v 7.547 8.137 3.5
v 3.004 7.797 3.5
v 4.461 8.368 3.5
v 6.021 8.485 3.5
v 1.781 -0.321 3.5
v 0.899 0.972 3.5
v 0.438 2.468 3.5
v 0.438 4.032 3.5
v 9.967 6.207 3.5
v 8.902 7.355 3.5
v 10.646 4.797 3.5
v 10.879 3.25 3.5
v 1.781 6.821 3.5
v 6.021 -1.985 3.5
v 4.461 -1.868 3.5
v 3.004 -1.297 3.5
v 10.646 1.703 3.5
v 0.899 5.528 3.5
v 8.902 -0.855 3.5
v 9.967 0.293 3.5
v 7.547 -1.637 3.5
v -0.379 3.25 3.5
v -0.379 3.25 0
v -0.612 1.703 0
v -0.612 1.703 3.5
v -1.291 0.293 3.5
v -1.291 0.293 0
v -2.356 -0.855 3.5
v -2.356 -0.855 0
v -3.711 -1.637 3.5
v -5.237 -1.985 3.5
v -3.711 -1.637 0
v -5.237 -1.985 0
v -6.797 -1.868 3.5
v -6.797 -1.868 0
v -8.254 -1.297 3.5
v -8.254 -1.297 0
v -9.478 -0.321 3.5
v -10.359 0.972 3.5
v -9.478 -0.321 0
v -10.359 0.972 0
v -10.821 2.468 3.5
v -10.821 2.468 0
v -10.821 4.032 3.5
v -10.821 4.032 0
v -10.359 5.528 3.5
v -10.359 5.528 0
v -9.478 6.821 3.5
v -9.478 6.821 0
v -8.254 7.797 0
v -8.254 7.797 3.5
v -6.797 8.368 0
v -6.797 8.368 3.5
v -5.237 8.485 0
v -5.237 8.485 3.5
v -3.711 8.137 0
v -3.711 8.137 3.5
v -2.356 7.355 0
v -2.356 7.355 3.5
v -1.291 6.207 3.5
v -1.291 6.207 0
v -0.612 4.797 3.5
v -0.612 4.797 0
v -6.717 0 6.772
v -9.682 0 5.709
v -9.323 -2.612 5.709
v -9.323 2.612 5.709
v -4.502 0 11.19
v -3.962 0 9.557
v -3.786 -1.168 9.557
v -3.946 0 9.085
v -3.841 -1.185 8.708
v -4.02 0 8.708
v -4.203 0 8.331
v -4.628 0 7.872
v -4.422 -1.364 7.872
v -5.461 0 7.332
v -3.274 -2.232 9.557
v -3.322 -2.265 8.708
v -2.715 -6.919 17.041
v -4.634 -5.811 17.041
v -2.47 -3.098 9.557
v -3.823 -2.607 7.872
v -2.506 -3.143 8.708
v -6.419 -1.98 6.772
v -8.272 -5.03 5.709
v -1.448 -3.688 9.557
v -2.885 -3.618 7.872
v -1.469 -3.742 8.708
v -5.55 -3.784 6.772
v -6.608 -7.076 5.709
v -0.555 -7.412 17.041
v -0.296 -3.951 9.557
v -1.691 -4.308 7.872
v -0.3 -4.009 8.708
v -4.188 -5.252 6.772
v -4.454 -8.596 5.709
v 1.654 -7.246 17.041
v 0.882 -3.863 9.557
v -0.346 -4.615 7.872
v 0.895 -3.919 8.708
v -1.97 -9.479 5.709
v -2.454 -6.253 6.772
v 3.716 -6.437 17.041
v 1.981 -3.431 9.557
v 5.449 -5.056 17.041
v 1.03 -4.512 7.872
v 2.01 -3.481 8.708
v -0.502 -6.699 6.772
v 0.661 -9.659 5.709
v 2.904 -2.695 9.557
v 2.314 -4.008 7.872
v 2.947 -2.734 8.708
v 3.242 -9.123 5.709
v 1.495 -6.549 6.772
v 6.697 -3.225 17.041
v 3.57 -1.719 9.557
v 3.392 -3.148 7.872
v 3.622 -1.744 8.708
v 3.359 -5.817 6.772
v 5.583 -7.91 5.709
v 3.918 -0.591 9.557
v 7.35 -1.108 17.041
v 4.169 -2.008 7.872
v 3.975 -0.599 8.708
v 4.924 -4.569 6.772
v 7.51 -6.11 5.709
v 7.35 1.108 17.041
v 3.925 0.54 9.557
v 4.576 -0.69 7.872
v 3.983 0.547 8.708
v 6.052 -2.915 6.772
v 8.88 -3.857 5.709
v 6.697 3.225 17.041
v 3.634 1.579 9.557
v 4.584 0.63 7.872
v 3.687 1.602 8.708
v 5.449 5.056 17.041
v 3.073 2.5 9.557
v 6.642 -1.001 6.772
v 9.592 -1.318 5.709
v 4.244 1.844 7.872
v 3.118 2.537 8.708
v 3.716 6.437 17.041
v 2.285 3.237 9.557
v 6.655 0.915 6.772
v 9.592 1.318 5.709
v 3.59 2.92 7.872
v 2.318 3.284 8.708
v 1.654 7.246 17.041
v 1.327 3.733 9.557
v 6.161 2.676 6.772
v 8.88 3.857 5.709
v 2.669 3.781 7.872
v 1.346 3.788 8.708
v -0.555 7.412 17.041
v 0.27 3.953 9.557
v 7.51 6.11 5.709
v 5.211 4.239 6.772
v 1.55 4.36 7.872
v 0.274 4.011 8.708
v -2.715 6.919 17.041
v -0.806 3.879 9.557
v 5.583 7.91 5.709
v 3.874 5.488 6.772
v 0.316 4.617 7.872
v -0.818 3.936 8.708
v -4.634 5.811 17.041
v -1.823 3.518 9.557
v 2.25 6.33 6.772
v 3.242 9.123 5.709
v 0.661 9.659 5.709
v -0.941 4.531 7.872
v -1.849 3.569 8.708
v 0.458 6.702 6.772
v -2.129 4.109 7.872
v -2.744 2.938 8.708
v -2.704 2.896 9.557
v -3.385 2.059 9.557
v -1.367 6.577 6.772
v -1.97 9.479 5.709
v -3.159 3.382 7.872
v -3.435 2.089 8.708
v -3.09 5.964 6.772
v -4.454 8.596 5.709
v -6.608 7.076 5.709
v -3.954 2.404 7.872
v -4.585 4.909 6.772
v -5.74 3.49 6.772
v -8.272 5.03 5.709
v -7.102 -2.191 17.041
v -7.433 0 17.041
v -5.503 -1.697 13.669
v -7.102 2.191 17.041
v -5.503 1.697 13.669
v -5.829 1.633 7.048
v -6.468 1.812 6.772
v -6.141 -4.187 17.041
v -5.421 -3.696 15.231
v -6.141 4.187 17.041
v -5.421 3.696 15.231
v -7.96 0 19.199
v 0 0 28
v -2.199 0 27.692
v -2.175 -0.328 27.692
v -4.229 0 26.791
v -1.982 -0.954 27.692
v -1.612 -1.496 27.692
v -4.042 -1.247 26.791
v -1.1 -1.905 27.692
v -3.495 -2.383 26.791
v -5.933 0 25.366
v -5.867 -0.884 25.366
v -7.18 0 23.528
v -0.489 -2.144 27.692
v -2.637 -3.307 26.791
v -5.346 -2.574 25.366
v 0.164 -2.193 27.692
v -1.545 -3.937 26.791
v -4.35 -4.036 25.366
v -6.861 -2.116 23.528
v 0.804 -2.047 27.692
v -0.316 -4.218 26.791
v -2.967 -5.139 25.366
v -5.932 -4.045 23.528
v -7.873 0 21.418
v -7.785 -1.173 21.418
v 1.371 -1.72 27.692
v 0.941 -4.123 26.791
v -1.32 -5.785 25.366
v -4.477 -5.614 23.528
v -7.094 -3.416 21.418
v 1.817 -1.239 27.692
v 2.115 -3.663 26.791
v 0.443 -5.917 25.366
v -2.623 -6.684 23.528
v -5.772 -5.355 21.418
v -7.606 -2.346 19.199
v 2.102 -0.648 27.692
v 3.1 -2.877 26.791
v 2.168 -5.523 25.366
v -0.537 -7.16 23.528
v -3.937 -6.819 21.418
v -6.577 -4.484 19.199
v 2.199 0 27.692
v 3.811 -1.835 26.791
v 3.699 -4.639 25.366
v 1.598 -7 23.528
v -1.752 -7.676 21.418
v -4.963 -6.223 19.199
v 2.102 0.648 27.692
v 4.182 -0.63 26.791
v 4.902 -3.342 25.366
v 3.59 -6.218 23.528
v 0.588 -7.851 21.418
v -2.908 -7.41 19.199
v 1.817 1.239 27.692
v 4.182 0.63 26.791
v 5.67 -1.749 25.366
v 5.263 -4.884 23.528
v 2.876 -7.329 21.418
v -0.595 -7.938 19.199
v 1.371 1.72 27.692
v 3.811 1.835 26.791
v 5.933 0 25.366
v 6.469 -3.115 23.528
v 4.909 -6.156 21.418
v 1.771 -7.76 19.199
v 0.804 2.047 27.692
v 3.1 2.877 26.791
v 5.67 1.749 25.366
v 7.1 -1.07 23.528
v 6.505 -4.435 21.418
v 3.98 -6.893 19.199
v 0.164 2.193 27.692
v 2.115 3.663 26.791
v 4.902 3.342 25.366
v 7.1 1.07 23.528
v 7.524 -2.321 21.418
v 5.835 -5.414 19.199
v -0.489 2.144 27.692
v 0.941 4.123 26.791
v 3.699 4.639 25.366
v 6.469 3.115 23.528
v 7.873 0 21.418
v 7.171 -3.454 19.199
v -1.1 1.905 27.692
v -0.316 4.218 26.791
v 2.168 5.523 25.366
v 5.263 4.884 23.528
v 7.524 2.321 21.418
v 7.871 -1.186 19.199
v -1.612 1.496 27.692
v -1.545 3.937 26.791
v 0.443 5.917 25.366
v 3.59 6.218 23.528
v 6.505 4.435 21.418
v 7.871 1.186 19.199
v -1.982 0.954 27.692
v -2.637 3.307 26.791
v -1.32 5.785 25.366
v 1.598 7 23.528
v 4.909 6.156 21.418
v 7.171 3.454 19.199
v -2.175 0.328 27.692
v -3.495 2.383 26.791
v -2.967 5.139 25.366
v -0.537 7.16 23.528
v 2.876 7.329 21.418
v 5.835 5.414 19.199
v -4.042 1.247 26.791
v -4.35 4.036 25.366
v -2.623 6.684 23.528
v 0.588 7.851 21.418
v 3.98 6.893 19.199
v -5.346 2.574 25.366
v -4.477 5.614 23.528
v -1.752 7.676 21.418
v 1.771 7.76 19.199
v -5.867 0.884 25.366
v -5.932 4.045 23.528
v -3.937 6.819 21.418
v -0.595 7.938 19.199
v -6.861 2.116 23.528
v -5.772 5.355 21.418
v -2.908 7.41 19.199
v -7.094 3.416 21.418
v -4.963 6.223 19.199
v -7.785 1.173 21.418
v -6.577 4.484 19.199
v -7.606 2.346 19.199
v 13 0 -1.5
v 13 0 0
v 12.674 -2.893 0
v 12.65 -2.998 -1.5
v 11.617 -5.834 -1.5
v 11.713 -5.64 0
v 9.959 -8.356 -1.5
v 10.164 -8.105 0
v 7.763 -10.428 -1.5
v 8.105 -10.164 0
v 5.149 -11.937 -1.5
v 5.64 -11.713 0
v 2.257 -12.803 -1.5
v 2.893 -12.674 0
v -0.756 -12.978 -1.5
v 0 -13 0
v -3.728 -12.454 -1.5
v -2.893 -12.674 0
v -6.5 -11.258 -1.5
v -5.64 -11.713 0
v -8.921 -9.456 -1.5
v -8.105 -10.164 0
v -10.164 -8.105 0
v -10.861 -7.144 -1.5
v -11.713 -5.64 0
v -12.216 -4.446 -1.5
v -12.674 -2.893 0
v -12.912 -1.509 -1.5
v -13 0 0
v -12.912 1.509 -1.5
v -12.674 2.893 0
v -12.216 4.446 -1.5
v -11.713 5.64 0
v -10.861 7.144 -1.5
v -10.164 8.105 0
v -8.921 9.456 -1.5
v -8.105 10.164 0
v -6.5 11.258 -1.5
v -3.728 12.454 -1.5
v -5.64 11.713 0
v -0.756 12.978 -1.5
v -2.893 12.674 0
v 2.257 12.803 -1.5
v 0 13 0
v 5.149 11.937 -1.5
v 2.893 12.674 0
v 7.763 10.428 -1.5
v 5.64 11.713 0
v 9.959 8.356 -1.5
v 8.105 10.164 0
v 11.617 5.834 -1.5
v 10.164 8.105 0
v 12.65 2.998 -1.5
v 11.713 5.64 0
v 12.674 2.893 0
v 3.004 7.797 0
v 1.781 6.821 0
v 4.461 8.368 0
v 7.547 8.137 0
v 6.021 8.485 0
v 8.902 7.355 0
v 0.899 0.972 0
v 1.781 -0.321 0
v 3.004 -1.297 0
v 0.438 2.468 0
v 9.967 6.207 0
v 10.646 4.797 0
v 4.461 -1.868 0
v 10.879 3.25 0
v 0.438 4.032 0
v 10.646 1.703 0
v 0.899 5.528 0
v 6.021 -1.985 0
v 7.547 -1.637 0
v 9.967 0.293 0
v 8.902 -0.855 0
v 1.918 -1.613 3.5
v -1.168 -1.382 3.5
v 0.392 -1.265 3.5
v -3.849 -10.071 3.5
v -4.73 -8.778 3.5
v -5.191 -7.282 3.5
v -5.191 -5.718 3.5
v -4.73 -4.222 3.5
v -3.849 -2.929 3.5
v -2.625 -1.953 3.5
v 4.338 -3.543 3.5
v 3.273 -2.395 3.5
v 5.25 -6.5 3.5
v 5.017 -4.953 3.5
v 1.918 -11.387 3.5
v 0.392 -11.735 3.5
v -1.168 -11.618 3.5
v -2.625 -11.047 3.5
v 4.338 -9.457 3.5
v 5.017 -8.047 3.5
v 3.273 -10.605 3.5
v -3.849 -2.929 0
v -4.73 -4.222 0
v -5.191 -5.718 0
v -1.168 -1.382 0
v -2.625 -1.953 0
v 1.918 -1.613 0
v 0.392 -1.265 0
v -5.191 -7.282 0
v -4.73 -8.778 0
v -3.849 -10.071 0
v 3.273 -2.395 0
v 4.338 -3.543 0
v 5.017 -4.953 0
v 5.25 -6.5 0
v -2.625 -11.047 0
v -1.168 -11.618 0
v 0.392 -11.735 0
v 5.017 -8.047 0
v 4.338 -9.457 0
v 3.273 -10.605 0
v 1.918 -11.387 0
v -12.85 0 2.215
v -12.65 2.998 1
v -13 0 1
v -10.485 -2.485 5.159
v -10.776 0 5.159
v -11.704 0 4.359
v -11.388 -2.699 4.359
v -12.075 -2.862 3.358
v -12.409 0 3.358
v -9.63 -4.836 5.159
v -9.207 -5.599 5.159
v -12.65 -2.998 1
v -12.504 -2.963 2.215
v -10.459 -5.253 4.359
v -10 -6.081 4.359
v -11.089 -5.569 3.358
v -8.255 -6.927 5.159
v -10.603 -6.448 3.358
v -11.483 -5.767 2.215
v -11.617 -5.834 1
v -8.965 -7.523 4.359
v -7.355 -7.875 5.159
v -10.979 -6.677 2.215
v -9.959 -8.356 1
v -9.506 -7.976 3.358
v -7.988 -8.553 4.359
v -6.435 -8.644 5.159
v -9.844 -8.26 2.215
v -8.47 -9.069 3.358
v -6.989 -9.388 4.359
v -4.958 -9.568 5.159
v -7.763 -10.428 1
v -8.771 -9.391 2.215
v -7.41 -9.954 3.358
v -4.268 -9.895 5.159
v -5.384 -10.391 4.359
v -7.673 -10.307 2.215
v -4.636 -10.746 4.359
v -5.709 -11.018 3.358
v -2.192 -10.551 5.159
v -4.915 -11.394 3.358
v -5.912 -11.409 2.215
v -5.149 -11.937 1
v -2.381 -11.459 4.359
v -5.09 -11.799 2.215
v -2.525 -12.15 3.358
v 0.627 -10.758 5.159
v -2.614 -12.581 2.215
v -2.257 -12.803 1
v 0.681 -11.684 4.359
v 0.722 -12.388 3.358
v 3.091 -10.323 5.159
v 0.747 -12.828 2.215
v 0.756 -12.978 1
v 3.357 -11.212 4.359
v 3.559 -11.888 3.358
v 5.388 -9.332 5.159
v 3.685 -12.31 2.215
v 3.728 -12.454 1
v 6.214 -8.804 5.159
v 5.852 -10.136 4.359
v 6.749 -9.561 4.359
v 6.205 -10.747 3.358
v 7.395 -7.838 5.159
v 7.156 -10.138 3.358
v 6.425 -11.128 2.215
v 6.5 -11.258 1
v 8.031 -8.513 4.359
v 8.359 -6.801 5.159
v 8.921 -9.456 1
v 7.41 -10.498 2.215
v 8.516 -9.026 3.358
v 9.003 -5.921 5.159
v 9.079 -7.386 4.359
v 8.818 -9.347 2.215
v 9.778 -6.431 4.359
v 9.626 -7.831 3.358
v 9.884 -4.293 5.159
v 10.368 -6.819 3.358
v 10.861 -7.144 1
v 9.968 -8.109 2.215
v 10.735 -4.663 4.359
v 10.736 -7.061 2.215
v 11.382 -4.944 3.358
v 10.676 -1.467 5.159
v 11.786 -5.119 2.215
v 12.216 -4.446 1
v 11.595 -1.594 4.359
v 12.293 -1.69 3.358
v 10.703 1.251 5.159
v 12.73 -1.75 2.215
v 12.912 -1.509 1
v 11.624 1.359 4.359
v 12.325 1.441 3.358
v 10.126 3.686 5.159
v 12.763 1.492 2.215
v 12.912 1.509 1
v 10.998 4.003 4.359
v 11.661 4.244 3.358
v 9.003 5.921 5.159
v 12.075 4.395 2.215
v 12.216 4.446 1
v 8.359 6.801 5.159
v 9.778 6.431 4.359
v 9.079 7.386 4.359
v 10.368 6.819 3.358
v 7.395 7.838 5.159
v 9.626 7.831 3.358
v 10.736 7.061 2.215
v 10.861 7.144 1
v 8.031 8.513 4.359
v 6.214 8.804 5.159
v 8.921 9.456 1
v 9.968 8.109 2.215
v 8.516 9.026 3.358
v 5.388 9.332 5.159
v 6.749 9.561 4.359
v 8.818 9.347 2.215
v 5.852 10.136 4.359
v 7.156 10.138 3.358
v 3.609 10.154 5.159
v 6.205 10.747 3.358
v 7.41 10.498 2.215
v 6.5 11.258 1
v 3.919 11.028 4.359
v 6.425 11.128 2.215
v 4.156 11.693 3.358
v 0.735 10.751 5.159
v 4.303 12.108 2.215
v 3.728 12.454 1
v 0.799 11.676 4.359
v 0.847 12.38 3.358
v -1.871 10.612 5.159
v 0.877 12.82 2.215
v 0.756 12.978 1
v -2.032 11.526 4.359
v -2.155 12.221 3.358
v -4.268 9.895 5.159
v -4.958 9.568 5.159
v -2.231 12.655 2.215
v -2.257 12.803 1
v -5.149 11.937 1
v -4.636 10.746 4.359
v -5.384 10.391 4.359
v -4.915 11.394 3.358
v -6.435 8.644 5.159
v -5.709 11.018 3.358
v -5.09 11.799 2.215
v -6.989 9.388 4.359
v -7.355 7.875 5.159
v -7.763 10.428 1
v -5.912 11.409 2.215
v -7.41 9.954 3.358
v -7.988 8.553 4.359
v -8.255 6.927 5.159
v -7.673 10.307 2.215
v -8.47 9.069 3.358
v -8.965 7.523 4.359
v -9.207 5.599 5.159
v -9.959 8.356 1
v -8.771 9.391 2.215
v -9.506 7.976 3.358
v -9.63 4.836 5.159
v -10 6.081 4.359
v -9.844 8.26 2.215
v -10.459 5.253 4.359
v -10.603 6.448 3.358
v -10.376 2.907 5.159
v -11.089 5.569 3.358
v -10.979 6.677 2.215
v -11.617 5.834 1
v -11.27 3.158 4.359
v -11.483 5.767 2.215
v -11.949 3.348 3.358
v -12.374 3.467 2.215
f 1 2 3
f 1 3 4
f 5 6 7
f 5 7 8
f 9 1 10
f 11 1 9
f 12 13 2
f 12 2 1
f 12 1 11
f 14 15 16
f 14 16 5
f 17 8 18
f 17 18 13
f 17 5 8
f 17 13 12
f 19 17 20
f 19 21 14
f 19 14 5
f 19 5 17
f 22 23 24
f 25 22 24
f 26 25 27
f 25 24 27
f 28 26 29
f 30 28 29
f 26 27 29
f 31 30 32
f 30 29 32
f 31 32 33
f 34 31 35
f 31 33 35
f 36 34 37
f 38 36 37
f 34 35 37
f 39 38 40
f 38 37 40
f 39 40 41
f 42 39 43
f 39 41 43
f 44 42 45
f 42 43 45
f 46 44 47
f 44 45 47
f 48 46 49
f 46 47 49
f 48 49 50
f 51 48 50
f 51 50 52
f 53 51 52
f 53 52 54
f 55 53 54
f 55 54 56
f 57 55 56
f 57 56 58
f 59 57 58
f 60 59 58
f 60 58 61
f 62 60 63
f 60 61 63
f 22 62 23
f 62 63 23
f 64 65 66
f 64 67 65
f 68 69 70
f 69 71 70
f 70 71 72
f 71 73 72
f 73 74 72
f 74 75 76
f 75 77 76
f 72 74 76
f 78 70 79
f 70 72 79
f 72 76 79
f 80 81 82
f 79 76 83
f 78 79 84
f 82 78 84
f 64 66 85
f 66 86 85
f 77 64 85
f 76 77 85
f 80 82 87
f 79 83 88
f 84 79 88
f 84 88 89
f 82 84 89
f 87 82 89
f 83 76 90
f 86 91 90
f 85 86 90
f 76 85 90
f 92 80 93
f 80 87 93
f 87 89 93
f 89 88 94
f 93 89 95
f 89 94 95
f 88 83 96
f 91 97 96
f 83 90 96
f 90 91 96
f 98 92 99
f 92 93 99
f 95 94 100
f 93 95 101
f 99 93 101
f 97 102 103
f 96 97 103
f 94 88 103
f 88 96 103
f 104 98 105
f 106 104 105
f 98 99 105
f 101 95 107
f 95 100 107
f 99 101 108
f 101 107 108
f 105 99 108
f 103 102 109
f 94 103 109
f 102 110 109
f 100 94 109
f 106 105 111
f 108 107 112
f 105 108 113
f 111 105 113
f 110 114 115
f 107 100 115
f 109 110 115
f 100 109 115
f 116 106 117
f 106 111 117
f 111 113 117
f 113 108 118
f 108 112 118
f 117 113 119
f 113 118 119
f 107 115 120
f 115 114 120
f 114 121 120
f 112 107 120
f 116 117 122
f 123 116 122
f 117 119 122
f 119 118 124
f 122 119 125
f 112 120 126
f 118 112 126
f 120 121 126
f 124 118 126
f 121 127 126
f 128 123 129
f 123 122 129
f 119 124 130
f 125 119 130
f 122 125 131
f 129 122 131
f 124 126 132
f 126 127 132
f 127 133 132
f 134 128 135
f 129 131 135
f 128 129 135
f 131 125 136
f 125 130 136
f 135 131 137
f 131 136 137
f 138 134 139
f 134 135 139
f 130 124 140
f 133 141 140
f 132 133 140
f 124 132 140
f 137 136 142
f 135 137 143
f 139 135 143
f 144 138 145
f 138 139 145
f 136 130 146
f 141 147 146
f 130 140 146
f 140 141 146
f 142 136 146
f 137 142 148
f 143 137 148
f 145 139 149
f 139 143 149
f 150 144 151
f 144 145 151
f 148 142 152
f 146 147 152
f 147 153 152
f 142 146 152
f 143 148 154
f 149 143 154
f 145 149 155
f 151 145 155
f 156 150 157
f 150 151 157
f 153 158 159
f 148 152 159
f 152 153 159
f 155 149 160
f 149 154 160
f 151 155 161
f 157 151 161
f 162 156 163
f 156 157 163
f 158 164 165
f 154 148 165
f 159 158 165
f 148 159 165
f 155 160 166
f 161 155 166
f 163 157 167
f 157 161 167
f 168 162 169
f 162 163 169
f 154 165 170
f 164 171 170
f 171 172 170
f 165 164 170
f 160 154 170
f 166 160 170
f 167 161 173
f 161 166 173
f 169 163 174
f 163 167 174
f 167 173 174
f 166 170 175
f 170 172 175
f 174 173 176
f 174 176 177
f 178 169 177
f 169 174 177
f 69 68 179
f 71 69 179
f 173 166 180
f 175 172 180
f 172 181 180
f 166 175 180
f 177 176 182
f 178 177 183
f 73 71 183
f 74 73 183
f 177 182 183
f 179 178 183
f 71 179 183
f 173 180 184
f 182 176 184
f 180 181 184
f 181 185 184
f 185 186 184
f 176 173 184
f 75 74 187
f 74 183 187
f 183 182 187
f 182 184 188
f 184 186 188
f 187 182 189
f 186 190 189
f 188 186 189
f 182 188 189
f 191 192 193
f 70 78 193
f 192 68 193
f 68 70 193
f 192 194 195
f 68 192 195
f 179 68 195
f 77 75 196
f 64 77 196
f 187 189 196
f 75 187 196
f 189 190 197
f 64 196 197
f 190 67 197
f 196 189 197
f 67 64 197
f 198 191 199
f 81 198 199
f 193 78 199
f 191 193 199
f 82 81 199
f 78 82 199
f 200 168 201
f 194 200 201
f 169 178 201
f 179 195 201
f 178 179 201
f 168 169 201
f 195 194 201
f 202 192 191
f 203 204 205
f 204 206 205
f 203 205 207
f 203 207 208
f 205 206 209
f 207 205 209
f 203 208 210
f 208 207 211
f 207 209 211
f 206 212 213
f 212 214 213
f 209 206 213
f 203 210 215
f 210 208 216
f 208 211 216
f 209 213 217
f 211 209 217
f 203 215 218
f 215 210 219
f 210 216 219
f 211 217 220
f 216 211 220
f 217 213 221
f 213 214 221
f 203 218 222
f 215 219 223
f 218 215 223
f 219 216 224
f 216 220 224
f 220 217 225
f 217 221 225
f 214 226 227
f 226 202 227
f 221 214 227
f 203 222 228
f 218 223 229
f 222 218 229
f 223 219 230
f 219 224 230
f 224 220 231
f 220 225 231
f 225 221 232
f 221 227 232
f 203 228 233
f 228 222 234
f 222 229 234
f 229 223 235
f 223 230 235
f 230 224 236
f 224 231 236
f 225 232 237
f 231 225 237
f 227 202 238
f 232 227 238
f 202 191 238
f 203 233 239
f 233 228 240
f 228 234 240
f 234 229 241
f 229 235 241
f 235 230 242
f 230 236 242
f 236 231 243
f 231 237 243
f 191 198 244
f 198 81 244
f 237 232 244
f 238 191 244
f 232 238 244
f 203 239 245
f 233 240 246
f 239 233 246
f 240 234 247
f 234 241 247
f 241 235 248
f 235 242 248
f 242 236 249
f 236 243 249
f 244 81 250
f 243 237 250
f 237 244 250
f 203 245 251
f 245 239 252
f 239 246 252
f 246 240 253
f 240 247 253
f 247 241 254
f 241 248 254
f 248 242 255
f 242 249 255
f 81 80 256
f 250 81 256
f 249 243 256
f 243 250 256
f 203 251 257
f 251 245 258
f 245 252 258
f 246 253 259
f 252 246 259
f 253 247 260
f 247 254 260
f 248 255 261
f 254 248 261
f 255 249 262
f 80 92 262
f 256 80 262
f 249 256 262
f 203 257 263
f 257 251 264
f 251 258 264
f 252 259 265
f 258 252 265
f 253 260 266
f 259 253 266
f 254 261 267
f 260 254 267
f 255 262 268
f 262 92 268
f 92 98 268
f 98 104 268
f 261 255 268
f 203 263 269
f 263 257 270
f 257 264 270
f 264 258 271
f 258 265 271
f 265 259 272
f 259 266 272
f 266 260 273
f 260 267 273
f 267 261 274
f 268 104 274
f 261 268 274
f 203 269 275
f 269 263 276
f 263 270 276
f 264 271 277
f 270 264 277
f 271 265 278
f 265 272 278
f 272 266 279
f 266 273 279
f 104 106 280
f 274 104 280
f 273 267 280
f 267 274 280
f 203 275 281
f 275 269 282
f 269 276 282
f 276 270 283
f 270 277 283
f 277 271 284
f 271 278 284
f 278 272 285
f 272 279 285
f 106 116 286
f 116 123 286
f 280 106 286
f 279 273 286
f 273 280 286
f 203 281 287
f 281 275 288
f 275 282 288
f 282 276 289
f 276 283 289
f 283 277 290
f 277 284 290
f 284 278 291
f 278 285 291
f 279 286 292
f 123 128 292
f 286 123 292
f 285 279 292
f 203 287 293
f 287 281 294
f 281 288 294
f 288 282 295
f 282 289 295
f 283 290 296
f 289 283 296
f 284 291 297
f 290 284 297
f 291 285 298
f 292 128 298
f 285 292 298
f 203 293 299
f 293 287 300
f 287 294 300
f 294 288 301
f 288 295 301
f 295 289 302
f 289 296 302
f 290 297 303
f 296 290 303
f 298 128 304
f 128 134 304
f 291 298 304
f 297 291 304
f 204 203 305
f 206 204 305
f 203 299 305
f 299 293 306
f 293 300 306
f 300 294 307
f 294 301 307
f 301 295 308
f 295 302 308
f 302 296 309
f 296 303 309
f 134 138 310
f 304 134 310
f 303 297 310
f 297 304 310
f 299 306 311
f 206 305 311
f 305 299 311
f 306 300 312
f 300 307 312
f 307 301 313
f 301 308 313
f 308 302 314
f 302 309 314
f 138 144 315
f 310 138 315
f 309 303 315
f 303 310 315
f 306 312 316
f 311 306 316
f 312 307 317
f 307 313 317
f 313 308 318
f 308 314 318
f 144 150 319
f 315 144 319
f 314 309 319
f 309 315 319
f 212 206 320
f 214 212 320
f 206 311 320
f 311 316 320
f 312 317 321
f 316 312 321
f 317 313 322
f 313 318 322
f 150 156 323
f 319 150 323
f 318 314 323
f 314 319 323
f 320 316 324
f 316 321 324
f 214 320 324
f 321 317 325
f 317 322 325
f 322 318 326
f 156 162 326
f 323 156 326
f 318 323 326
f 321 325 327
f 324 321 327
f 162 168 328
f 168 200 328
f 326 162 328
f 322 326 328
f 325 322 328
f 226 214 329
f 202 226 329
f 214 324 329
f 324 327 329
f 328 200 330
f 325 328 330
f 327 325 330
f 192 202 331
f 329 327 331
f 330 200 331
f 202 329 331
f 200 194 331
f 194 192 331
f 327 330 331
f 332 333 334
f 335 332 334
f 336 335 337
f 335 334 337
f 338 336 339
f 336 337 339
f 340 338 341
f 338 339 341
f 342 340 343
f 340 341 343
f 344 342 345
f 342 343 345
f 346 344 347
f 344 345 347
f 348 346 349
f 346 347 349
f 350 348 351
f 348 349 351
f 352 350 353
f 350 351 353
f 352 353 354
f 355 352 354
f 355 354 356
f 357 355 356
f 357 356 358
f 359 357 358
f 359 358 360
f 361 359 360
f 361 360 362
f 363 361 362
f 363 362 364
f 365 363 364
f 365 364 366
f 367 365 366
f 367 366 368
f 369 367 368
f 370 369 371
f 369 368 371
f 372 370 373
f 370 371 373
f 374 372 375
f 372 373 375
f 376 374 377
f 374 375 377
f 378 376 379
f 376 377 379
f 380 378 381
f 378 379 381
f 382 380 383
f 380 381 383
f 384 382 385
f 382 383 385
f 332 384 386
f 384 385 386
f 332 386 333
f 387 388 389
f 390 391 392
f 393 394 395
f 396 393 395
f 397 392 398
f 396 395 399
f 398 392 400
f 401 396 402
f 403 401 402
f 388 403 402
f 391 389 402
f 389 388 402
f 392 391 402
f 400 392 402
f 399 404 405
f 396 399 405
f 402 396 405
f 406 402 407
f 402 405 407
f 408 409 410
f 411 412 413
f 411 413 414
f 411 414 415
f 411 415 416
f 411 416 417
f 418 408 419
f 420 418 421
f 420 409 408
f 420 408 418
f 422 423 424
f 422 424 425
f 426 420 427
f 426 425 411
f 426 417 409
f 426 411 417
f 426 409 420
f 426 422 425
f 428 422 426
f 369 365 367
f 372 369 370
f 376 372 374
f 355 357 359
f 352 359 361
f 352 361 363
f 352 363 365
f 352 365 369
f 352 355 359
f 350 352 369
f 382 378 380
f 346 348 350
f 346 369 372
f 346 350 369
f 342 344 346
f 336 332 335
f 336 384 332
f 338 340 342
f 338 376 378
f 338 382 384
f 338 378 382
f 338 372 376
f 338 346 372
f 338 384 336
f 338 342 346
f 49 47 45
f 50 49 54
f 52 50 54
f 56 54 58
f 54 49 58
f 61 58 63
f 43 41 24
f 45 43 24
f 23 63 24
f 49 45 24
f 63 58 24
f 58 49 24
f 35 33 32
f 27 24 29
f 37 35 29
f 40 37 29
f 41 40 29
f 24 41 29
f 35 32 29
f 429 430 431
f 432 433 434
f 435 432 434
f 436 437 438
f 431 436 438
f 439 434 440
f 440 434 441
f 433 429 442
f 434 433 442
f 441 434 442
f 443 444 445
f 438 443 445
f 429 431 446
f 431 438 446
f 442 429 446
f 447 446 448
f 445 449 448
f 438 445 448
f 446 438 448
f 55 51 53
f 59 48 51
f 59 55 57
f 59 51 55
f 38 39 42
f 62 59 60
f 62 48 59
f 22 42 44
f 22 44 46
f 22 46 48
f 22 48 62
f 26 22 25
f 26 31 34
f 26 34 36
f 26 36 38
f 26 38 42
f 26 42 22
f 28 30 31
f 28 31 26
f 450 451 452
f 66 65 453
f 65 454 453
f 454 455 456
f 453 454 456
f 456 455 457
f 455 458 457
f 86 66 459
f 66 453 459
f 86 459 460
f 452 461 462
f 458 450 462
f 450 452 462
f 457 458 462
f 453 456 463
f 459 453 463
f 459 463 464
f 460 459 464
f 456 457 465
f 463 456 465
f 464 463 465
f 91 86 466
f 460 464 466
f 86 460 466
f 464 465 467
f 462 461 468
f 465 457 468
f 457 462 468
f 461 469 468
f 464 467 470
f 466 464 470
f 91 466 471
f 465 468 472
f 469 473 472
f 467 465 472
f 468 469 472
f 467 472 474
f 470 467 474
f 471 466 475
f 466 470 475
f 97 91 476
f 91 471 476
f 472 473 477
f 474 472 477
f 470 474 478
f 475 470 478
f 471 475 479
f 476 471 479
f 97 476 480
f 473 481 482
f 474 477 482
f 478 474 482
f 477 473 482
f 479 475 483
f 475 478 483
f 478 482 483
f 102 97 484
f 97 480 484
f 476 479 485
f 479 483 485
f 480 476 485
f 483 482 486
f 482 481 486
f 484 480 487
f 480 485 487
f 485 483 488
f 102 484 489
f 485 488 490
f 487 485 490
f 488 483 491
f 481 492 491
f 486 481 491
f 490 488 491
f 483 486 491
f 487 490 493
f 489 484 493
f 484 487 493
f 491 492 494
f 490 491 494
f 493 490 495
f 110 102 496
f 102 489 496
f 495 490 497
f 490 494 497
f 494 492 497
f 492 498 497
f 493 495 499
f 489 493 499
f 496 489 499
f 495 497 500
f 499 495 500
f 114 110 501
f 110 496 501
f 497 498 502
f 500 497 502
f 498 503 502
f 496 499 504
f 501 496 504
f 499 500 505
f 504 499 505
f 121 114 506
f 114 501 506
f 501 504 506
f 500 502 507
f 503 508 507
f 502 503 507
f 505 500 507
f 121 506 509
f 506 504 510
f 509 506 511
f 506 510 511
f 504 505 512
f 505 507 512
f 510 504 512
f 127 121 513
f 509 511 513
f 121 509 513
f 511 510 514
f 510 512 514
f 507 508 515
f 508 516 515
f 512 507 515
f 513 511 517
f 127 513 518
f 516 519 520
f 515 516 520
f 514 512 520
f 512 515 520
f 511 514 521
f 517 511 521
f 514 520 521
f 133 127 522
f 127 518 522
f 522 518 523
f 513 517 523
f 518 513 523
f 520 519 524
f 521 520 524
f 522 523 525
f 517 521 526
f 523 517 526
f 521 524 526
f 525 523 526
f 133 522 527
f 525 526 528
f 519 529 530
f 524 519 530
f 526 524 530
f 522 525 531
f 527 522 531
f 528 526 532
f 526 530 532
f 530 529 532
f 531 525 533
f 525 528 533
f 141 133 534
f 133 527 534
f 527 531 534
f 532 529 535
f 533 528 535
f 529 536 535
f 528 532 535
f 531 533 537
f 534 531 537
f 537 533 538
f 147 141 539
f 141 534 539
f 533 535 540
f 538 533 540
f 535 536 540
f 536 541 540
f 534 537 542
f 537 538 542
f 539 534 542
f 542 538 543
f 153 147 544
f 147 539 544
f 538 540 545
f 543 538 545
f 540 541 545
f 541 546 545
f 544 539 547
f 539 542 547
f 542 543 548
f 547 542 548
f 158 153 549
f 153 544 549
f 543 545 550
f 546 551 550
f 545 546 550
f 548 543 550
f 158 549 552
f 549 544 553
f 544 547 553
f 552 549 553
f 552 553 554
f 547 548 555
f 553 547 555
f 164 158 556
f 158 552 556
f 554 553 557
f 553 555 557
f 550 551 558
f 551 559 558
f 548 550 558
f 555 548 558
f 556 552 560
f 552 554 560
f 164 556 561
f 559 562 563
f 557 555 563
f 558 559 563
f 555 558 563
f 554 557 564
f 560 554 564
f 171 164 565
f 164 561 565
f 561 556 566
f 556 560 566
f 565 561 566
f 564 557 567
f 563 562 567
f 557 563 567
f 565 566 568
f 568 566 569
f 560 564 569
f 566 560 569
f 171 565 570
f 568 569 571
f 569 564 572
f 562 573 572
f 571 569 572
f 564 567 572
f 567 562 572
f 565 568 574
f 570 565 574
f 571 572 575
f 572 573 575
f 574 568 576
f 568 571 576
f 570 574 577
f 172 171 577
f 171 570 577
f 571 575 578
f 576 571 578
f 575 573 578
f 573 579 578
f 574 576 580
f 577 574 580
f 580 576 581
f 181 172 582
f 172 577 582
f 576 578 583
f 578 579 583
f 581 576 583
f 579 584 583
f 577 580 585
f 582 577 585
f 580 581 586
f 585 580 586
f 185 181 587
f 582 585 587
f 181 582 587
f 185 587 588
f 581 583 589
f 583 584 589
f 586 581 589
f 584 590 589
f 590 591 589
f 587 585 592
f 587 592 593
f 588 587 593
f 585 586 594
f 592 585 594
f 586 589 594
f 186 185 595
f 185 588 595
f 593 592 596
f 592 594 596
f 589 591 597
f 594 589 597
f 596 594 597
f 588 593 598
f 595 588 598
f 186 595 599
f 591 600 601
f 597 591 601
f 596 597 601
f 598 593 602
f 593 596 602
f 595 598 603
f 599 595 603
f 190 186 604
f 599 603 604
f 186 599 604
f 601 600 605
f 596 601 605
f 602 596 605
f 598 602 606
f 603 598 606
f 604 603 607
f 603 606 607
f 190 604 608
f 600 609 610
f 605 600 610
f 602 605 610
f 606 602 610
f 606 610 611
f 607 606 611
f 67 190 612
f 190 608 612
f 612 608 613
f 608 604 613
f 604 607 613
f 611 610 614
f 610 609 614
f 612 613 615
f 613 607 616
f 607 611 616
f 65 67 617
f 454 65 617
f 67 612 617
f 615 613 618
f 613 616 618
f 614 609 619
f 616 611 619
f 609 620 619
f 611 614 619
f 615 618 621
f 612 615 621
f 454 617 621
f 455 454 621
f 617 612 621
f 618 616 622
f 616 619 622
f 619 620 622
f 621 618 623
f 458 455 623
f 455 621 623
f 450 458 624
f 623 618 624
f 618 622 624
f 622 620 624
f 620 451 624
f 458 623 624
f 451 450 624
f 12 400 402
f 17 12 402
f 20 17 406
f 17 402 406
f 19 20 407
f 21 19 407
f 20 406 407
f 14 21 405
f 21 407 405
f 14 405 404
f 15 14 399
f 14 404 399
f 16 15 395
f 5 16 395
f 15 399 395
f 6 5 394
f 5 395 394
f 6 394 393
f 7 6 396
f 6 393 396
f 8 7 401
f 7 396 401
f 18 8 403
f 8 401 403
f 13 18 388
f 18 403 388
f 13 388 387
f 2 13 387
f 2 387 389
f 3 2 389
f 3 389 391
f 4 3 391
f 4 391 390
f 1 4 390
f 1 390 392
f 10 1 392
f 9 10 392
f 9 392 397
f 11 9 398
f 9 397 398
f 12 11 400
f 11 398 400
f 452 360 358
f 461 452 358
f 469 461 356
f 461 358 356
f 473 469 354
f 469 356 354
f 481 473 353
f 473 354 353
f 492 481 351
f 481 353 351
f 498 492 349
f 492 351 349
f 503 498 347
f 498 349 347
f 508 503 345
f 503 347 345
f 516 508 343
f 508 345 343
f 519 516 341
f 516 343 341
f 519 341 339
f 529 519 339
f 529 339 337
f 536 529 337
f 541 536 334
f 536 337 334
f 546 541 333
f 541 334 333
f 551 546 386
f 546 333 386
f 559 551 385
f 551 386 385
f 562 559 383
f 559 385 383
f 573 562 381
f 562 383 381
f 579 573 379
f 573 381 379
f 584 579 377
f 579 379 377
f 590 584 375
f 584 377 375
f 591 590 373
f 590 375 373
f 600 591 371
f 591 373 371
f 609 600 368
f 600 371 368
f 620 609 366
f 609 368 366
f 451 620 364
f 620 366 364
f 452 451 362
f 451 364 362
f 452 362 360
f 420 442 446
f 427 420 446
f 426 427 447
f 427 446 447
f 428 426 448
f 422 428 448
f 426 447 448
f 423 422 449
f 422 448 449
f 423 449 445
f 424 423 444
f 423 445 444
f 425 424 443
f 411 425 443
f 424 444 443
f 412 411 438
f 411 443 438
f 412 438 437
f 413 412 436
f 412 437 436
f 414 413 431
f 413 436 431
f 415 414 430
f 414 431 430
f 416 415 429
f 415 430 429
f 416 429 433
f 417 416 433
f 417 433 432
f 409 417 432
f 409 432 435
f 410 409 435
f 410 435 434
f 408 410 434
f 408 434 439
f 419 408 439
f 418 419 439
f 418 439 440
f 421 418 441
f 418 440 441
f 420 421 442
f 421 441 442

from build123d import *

# Parameters (mm, degrees)
F2_R     = 5.25
F3_DEPTH = 3.5
F4_R     = 13
F5_DEPTH = 1.5


with BuildPart() as f1:
    # F0 (on Front) → F1 (revolve)
    with BuildSketch(Plane.XZ):
        with BuildLine():
            Line((-13, 0), (0, 0))
            Line((0, 0), (0, 28))
            ThreePointArc((0, 28), (-6.6208594363, 24.4904588101), (-7.4326741465, 17.0410550813))
            add(Edge.make_bspline(
                [(-7.4326741465, 17.0410550813), (-5.1480043112, 12.0772723951), (-1.8048124165, 8.1672623986), (-7.1835572352, 6.6008977536), (-9.6816832971, 5.7087090893)],
                knots=[0, 0, 0, 0, 0.495820355, 0.8469277652, 0.8469277652, 0.8469277652, 0.8469277652], degree=3))
            ThreePointArc((-9.6816832971, 5.7087090893), (-12.0870782037, 3.8802416144), (-13, 1))
            Line((-13, 1), (-13, 0))
        make_face()
    revolve(axis=Axis((0, 0, 14), (0, 0, 1)))

    # F2 (on face) → F3 (cut)
    with BuildSketch(Plane(origin=(0, 0, 0), x_dir=(1, 0, 0), z_dir=(0, 0, -1))):
        with Locations((-5.6291651246, -3.25)):
            Circle(F2_R)
        with Locations((5.6291651246, -3.25)):
            Circle(F2_R)
        with Locations((0, 6.5)):
            Circle(F2_R)
    extrude(amount=-F3_DEPTH, mode=Mode.SUBTRACT)

    # F4 (on face) → F5 (join)
    with BuildSketch(Plane(origin=(0, 0, 0), x_dir=(1, 0, 0), z_dir=(0, 0, -1))):
        Circle(F4_R)
    extrude(amount=F5_DEPTH)


solid = f1.part
